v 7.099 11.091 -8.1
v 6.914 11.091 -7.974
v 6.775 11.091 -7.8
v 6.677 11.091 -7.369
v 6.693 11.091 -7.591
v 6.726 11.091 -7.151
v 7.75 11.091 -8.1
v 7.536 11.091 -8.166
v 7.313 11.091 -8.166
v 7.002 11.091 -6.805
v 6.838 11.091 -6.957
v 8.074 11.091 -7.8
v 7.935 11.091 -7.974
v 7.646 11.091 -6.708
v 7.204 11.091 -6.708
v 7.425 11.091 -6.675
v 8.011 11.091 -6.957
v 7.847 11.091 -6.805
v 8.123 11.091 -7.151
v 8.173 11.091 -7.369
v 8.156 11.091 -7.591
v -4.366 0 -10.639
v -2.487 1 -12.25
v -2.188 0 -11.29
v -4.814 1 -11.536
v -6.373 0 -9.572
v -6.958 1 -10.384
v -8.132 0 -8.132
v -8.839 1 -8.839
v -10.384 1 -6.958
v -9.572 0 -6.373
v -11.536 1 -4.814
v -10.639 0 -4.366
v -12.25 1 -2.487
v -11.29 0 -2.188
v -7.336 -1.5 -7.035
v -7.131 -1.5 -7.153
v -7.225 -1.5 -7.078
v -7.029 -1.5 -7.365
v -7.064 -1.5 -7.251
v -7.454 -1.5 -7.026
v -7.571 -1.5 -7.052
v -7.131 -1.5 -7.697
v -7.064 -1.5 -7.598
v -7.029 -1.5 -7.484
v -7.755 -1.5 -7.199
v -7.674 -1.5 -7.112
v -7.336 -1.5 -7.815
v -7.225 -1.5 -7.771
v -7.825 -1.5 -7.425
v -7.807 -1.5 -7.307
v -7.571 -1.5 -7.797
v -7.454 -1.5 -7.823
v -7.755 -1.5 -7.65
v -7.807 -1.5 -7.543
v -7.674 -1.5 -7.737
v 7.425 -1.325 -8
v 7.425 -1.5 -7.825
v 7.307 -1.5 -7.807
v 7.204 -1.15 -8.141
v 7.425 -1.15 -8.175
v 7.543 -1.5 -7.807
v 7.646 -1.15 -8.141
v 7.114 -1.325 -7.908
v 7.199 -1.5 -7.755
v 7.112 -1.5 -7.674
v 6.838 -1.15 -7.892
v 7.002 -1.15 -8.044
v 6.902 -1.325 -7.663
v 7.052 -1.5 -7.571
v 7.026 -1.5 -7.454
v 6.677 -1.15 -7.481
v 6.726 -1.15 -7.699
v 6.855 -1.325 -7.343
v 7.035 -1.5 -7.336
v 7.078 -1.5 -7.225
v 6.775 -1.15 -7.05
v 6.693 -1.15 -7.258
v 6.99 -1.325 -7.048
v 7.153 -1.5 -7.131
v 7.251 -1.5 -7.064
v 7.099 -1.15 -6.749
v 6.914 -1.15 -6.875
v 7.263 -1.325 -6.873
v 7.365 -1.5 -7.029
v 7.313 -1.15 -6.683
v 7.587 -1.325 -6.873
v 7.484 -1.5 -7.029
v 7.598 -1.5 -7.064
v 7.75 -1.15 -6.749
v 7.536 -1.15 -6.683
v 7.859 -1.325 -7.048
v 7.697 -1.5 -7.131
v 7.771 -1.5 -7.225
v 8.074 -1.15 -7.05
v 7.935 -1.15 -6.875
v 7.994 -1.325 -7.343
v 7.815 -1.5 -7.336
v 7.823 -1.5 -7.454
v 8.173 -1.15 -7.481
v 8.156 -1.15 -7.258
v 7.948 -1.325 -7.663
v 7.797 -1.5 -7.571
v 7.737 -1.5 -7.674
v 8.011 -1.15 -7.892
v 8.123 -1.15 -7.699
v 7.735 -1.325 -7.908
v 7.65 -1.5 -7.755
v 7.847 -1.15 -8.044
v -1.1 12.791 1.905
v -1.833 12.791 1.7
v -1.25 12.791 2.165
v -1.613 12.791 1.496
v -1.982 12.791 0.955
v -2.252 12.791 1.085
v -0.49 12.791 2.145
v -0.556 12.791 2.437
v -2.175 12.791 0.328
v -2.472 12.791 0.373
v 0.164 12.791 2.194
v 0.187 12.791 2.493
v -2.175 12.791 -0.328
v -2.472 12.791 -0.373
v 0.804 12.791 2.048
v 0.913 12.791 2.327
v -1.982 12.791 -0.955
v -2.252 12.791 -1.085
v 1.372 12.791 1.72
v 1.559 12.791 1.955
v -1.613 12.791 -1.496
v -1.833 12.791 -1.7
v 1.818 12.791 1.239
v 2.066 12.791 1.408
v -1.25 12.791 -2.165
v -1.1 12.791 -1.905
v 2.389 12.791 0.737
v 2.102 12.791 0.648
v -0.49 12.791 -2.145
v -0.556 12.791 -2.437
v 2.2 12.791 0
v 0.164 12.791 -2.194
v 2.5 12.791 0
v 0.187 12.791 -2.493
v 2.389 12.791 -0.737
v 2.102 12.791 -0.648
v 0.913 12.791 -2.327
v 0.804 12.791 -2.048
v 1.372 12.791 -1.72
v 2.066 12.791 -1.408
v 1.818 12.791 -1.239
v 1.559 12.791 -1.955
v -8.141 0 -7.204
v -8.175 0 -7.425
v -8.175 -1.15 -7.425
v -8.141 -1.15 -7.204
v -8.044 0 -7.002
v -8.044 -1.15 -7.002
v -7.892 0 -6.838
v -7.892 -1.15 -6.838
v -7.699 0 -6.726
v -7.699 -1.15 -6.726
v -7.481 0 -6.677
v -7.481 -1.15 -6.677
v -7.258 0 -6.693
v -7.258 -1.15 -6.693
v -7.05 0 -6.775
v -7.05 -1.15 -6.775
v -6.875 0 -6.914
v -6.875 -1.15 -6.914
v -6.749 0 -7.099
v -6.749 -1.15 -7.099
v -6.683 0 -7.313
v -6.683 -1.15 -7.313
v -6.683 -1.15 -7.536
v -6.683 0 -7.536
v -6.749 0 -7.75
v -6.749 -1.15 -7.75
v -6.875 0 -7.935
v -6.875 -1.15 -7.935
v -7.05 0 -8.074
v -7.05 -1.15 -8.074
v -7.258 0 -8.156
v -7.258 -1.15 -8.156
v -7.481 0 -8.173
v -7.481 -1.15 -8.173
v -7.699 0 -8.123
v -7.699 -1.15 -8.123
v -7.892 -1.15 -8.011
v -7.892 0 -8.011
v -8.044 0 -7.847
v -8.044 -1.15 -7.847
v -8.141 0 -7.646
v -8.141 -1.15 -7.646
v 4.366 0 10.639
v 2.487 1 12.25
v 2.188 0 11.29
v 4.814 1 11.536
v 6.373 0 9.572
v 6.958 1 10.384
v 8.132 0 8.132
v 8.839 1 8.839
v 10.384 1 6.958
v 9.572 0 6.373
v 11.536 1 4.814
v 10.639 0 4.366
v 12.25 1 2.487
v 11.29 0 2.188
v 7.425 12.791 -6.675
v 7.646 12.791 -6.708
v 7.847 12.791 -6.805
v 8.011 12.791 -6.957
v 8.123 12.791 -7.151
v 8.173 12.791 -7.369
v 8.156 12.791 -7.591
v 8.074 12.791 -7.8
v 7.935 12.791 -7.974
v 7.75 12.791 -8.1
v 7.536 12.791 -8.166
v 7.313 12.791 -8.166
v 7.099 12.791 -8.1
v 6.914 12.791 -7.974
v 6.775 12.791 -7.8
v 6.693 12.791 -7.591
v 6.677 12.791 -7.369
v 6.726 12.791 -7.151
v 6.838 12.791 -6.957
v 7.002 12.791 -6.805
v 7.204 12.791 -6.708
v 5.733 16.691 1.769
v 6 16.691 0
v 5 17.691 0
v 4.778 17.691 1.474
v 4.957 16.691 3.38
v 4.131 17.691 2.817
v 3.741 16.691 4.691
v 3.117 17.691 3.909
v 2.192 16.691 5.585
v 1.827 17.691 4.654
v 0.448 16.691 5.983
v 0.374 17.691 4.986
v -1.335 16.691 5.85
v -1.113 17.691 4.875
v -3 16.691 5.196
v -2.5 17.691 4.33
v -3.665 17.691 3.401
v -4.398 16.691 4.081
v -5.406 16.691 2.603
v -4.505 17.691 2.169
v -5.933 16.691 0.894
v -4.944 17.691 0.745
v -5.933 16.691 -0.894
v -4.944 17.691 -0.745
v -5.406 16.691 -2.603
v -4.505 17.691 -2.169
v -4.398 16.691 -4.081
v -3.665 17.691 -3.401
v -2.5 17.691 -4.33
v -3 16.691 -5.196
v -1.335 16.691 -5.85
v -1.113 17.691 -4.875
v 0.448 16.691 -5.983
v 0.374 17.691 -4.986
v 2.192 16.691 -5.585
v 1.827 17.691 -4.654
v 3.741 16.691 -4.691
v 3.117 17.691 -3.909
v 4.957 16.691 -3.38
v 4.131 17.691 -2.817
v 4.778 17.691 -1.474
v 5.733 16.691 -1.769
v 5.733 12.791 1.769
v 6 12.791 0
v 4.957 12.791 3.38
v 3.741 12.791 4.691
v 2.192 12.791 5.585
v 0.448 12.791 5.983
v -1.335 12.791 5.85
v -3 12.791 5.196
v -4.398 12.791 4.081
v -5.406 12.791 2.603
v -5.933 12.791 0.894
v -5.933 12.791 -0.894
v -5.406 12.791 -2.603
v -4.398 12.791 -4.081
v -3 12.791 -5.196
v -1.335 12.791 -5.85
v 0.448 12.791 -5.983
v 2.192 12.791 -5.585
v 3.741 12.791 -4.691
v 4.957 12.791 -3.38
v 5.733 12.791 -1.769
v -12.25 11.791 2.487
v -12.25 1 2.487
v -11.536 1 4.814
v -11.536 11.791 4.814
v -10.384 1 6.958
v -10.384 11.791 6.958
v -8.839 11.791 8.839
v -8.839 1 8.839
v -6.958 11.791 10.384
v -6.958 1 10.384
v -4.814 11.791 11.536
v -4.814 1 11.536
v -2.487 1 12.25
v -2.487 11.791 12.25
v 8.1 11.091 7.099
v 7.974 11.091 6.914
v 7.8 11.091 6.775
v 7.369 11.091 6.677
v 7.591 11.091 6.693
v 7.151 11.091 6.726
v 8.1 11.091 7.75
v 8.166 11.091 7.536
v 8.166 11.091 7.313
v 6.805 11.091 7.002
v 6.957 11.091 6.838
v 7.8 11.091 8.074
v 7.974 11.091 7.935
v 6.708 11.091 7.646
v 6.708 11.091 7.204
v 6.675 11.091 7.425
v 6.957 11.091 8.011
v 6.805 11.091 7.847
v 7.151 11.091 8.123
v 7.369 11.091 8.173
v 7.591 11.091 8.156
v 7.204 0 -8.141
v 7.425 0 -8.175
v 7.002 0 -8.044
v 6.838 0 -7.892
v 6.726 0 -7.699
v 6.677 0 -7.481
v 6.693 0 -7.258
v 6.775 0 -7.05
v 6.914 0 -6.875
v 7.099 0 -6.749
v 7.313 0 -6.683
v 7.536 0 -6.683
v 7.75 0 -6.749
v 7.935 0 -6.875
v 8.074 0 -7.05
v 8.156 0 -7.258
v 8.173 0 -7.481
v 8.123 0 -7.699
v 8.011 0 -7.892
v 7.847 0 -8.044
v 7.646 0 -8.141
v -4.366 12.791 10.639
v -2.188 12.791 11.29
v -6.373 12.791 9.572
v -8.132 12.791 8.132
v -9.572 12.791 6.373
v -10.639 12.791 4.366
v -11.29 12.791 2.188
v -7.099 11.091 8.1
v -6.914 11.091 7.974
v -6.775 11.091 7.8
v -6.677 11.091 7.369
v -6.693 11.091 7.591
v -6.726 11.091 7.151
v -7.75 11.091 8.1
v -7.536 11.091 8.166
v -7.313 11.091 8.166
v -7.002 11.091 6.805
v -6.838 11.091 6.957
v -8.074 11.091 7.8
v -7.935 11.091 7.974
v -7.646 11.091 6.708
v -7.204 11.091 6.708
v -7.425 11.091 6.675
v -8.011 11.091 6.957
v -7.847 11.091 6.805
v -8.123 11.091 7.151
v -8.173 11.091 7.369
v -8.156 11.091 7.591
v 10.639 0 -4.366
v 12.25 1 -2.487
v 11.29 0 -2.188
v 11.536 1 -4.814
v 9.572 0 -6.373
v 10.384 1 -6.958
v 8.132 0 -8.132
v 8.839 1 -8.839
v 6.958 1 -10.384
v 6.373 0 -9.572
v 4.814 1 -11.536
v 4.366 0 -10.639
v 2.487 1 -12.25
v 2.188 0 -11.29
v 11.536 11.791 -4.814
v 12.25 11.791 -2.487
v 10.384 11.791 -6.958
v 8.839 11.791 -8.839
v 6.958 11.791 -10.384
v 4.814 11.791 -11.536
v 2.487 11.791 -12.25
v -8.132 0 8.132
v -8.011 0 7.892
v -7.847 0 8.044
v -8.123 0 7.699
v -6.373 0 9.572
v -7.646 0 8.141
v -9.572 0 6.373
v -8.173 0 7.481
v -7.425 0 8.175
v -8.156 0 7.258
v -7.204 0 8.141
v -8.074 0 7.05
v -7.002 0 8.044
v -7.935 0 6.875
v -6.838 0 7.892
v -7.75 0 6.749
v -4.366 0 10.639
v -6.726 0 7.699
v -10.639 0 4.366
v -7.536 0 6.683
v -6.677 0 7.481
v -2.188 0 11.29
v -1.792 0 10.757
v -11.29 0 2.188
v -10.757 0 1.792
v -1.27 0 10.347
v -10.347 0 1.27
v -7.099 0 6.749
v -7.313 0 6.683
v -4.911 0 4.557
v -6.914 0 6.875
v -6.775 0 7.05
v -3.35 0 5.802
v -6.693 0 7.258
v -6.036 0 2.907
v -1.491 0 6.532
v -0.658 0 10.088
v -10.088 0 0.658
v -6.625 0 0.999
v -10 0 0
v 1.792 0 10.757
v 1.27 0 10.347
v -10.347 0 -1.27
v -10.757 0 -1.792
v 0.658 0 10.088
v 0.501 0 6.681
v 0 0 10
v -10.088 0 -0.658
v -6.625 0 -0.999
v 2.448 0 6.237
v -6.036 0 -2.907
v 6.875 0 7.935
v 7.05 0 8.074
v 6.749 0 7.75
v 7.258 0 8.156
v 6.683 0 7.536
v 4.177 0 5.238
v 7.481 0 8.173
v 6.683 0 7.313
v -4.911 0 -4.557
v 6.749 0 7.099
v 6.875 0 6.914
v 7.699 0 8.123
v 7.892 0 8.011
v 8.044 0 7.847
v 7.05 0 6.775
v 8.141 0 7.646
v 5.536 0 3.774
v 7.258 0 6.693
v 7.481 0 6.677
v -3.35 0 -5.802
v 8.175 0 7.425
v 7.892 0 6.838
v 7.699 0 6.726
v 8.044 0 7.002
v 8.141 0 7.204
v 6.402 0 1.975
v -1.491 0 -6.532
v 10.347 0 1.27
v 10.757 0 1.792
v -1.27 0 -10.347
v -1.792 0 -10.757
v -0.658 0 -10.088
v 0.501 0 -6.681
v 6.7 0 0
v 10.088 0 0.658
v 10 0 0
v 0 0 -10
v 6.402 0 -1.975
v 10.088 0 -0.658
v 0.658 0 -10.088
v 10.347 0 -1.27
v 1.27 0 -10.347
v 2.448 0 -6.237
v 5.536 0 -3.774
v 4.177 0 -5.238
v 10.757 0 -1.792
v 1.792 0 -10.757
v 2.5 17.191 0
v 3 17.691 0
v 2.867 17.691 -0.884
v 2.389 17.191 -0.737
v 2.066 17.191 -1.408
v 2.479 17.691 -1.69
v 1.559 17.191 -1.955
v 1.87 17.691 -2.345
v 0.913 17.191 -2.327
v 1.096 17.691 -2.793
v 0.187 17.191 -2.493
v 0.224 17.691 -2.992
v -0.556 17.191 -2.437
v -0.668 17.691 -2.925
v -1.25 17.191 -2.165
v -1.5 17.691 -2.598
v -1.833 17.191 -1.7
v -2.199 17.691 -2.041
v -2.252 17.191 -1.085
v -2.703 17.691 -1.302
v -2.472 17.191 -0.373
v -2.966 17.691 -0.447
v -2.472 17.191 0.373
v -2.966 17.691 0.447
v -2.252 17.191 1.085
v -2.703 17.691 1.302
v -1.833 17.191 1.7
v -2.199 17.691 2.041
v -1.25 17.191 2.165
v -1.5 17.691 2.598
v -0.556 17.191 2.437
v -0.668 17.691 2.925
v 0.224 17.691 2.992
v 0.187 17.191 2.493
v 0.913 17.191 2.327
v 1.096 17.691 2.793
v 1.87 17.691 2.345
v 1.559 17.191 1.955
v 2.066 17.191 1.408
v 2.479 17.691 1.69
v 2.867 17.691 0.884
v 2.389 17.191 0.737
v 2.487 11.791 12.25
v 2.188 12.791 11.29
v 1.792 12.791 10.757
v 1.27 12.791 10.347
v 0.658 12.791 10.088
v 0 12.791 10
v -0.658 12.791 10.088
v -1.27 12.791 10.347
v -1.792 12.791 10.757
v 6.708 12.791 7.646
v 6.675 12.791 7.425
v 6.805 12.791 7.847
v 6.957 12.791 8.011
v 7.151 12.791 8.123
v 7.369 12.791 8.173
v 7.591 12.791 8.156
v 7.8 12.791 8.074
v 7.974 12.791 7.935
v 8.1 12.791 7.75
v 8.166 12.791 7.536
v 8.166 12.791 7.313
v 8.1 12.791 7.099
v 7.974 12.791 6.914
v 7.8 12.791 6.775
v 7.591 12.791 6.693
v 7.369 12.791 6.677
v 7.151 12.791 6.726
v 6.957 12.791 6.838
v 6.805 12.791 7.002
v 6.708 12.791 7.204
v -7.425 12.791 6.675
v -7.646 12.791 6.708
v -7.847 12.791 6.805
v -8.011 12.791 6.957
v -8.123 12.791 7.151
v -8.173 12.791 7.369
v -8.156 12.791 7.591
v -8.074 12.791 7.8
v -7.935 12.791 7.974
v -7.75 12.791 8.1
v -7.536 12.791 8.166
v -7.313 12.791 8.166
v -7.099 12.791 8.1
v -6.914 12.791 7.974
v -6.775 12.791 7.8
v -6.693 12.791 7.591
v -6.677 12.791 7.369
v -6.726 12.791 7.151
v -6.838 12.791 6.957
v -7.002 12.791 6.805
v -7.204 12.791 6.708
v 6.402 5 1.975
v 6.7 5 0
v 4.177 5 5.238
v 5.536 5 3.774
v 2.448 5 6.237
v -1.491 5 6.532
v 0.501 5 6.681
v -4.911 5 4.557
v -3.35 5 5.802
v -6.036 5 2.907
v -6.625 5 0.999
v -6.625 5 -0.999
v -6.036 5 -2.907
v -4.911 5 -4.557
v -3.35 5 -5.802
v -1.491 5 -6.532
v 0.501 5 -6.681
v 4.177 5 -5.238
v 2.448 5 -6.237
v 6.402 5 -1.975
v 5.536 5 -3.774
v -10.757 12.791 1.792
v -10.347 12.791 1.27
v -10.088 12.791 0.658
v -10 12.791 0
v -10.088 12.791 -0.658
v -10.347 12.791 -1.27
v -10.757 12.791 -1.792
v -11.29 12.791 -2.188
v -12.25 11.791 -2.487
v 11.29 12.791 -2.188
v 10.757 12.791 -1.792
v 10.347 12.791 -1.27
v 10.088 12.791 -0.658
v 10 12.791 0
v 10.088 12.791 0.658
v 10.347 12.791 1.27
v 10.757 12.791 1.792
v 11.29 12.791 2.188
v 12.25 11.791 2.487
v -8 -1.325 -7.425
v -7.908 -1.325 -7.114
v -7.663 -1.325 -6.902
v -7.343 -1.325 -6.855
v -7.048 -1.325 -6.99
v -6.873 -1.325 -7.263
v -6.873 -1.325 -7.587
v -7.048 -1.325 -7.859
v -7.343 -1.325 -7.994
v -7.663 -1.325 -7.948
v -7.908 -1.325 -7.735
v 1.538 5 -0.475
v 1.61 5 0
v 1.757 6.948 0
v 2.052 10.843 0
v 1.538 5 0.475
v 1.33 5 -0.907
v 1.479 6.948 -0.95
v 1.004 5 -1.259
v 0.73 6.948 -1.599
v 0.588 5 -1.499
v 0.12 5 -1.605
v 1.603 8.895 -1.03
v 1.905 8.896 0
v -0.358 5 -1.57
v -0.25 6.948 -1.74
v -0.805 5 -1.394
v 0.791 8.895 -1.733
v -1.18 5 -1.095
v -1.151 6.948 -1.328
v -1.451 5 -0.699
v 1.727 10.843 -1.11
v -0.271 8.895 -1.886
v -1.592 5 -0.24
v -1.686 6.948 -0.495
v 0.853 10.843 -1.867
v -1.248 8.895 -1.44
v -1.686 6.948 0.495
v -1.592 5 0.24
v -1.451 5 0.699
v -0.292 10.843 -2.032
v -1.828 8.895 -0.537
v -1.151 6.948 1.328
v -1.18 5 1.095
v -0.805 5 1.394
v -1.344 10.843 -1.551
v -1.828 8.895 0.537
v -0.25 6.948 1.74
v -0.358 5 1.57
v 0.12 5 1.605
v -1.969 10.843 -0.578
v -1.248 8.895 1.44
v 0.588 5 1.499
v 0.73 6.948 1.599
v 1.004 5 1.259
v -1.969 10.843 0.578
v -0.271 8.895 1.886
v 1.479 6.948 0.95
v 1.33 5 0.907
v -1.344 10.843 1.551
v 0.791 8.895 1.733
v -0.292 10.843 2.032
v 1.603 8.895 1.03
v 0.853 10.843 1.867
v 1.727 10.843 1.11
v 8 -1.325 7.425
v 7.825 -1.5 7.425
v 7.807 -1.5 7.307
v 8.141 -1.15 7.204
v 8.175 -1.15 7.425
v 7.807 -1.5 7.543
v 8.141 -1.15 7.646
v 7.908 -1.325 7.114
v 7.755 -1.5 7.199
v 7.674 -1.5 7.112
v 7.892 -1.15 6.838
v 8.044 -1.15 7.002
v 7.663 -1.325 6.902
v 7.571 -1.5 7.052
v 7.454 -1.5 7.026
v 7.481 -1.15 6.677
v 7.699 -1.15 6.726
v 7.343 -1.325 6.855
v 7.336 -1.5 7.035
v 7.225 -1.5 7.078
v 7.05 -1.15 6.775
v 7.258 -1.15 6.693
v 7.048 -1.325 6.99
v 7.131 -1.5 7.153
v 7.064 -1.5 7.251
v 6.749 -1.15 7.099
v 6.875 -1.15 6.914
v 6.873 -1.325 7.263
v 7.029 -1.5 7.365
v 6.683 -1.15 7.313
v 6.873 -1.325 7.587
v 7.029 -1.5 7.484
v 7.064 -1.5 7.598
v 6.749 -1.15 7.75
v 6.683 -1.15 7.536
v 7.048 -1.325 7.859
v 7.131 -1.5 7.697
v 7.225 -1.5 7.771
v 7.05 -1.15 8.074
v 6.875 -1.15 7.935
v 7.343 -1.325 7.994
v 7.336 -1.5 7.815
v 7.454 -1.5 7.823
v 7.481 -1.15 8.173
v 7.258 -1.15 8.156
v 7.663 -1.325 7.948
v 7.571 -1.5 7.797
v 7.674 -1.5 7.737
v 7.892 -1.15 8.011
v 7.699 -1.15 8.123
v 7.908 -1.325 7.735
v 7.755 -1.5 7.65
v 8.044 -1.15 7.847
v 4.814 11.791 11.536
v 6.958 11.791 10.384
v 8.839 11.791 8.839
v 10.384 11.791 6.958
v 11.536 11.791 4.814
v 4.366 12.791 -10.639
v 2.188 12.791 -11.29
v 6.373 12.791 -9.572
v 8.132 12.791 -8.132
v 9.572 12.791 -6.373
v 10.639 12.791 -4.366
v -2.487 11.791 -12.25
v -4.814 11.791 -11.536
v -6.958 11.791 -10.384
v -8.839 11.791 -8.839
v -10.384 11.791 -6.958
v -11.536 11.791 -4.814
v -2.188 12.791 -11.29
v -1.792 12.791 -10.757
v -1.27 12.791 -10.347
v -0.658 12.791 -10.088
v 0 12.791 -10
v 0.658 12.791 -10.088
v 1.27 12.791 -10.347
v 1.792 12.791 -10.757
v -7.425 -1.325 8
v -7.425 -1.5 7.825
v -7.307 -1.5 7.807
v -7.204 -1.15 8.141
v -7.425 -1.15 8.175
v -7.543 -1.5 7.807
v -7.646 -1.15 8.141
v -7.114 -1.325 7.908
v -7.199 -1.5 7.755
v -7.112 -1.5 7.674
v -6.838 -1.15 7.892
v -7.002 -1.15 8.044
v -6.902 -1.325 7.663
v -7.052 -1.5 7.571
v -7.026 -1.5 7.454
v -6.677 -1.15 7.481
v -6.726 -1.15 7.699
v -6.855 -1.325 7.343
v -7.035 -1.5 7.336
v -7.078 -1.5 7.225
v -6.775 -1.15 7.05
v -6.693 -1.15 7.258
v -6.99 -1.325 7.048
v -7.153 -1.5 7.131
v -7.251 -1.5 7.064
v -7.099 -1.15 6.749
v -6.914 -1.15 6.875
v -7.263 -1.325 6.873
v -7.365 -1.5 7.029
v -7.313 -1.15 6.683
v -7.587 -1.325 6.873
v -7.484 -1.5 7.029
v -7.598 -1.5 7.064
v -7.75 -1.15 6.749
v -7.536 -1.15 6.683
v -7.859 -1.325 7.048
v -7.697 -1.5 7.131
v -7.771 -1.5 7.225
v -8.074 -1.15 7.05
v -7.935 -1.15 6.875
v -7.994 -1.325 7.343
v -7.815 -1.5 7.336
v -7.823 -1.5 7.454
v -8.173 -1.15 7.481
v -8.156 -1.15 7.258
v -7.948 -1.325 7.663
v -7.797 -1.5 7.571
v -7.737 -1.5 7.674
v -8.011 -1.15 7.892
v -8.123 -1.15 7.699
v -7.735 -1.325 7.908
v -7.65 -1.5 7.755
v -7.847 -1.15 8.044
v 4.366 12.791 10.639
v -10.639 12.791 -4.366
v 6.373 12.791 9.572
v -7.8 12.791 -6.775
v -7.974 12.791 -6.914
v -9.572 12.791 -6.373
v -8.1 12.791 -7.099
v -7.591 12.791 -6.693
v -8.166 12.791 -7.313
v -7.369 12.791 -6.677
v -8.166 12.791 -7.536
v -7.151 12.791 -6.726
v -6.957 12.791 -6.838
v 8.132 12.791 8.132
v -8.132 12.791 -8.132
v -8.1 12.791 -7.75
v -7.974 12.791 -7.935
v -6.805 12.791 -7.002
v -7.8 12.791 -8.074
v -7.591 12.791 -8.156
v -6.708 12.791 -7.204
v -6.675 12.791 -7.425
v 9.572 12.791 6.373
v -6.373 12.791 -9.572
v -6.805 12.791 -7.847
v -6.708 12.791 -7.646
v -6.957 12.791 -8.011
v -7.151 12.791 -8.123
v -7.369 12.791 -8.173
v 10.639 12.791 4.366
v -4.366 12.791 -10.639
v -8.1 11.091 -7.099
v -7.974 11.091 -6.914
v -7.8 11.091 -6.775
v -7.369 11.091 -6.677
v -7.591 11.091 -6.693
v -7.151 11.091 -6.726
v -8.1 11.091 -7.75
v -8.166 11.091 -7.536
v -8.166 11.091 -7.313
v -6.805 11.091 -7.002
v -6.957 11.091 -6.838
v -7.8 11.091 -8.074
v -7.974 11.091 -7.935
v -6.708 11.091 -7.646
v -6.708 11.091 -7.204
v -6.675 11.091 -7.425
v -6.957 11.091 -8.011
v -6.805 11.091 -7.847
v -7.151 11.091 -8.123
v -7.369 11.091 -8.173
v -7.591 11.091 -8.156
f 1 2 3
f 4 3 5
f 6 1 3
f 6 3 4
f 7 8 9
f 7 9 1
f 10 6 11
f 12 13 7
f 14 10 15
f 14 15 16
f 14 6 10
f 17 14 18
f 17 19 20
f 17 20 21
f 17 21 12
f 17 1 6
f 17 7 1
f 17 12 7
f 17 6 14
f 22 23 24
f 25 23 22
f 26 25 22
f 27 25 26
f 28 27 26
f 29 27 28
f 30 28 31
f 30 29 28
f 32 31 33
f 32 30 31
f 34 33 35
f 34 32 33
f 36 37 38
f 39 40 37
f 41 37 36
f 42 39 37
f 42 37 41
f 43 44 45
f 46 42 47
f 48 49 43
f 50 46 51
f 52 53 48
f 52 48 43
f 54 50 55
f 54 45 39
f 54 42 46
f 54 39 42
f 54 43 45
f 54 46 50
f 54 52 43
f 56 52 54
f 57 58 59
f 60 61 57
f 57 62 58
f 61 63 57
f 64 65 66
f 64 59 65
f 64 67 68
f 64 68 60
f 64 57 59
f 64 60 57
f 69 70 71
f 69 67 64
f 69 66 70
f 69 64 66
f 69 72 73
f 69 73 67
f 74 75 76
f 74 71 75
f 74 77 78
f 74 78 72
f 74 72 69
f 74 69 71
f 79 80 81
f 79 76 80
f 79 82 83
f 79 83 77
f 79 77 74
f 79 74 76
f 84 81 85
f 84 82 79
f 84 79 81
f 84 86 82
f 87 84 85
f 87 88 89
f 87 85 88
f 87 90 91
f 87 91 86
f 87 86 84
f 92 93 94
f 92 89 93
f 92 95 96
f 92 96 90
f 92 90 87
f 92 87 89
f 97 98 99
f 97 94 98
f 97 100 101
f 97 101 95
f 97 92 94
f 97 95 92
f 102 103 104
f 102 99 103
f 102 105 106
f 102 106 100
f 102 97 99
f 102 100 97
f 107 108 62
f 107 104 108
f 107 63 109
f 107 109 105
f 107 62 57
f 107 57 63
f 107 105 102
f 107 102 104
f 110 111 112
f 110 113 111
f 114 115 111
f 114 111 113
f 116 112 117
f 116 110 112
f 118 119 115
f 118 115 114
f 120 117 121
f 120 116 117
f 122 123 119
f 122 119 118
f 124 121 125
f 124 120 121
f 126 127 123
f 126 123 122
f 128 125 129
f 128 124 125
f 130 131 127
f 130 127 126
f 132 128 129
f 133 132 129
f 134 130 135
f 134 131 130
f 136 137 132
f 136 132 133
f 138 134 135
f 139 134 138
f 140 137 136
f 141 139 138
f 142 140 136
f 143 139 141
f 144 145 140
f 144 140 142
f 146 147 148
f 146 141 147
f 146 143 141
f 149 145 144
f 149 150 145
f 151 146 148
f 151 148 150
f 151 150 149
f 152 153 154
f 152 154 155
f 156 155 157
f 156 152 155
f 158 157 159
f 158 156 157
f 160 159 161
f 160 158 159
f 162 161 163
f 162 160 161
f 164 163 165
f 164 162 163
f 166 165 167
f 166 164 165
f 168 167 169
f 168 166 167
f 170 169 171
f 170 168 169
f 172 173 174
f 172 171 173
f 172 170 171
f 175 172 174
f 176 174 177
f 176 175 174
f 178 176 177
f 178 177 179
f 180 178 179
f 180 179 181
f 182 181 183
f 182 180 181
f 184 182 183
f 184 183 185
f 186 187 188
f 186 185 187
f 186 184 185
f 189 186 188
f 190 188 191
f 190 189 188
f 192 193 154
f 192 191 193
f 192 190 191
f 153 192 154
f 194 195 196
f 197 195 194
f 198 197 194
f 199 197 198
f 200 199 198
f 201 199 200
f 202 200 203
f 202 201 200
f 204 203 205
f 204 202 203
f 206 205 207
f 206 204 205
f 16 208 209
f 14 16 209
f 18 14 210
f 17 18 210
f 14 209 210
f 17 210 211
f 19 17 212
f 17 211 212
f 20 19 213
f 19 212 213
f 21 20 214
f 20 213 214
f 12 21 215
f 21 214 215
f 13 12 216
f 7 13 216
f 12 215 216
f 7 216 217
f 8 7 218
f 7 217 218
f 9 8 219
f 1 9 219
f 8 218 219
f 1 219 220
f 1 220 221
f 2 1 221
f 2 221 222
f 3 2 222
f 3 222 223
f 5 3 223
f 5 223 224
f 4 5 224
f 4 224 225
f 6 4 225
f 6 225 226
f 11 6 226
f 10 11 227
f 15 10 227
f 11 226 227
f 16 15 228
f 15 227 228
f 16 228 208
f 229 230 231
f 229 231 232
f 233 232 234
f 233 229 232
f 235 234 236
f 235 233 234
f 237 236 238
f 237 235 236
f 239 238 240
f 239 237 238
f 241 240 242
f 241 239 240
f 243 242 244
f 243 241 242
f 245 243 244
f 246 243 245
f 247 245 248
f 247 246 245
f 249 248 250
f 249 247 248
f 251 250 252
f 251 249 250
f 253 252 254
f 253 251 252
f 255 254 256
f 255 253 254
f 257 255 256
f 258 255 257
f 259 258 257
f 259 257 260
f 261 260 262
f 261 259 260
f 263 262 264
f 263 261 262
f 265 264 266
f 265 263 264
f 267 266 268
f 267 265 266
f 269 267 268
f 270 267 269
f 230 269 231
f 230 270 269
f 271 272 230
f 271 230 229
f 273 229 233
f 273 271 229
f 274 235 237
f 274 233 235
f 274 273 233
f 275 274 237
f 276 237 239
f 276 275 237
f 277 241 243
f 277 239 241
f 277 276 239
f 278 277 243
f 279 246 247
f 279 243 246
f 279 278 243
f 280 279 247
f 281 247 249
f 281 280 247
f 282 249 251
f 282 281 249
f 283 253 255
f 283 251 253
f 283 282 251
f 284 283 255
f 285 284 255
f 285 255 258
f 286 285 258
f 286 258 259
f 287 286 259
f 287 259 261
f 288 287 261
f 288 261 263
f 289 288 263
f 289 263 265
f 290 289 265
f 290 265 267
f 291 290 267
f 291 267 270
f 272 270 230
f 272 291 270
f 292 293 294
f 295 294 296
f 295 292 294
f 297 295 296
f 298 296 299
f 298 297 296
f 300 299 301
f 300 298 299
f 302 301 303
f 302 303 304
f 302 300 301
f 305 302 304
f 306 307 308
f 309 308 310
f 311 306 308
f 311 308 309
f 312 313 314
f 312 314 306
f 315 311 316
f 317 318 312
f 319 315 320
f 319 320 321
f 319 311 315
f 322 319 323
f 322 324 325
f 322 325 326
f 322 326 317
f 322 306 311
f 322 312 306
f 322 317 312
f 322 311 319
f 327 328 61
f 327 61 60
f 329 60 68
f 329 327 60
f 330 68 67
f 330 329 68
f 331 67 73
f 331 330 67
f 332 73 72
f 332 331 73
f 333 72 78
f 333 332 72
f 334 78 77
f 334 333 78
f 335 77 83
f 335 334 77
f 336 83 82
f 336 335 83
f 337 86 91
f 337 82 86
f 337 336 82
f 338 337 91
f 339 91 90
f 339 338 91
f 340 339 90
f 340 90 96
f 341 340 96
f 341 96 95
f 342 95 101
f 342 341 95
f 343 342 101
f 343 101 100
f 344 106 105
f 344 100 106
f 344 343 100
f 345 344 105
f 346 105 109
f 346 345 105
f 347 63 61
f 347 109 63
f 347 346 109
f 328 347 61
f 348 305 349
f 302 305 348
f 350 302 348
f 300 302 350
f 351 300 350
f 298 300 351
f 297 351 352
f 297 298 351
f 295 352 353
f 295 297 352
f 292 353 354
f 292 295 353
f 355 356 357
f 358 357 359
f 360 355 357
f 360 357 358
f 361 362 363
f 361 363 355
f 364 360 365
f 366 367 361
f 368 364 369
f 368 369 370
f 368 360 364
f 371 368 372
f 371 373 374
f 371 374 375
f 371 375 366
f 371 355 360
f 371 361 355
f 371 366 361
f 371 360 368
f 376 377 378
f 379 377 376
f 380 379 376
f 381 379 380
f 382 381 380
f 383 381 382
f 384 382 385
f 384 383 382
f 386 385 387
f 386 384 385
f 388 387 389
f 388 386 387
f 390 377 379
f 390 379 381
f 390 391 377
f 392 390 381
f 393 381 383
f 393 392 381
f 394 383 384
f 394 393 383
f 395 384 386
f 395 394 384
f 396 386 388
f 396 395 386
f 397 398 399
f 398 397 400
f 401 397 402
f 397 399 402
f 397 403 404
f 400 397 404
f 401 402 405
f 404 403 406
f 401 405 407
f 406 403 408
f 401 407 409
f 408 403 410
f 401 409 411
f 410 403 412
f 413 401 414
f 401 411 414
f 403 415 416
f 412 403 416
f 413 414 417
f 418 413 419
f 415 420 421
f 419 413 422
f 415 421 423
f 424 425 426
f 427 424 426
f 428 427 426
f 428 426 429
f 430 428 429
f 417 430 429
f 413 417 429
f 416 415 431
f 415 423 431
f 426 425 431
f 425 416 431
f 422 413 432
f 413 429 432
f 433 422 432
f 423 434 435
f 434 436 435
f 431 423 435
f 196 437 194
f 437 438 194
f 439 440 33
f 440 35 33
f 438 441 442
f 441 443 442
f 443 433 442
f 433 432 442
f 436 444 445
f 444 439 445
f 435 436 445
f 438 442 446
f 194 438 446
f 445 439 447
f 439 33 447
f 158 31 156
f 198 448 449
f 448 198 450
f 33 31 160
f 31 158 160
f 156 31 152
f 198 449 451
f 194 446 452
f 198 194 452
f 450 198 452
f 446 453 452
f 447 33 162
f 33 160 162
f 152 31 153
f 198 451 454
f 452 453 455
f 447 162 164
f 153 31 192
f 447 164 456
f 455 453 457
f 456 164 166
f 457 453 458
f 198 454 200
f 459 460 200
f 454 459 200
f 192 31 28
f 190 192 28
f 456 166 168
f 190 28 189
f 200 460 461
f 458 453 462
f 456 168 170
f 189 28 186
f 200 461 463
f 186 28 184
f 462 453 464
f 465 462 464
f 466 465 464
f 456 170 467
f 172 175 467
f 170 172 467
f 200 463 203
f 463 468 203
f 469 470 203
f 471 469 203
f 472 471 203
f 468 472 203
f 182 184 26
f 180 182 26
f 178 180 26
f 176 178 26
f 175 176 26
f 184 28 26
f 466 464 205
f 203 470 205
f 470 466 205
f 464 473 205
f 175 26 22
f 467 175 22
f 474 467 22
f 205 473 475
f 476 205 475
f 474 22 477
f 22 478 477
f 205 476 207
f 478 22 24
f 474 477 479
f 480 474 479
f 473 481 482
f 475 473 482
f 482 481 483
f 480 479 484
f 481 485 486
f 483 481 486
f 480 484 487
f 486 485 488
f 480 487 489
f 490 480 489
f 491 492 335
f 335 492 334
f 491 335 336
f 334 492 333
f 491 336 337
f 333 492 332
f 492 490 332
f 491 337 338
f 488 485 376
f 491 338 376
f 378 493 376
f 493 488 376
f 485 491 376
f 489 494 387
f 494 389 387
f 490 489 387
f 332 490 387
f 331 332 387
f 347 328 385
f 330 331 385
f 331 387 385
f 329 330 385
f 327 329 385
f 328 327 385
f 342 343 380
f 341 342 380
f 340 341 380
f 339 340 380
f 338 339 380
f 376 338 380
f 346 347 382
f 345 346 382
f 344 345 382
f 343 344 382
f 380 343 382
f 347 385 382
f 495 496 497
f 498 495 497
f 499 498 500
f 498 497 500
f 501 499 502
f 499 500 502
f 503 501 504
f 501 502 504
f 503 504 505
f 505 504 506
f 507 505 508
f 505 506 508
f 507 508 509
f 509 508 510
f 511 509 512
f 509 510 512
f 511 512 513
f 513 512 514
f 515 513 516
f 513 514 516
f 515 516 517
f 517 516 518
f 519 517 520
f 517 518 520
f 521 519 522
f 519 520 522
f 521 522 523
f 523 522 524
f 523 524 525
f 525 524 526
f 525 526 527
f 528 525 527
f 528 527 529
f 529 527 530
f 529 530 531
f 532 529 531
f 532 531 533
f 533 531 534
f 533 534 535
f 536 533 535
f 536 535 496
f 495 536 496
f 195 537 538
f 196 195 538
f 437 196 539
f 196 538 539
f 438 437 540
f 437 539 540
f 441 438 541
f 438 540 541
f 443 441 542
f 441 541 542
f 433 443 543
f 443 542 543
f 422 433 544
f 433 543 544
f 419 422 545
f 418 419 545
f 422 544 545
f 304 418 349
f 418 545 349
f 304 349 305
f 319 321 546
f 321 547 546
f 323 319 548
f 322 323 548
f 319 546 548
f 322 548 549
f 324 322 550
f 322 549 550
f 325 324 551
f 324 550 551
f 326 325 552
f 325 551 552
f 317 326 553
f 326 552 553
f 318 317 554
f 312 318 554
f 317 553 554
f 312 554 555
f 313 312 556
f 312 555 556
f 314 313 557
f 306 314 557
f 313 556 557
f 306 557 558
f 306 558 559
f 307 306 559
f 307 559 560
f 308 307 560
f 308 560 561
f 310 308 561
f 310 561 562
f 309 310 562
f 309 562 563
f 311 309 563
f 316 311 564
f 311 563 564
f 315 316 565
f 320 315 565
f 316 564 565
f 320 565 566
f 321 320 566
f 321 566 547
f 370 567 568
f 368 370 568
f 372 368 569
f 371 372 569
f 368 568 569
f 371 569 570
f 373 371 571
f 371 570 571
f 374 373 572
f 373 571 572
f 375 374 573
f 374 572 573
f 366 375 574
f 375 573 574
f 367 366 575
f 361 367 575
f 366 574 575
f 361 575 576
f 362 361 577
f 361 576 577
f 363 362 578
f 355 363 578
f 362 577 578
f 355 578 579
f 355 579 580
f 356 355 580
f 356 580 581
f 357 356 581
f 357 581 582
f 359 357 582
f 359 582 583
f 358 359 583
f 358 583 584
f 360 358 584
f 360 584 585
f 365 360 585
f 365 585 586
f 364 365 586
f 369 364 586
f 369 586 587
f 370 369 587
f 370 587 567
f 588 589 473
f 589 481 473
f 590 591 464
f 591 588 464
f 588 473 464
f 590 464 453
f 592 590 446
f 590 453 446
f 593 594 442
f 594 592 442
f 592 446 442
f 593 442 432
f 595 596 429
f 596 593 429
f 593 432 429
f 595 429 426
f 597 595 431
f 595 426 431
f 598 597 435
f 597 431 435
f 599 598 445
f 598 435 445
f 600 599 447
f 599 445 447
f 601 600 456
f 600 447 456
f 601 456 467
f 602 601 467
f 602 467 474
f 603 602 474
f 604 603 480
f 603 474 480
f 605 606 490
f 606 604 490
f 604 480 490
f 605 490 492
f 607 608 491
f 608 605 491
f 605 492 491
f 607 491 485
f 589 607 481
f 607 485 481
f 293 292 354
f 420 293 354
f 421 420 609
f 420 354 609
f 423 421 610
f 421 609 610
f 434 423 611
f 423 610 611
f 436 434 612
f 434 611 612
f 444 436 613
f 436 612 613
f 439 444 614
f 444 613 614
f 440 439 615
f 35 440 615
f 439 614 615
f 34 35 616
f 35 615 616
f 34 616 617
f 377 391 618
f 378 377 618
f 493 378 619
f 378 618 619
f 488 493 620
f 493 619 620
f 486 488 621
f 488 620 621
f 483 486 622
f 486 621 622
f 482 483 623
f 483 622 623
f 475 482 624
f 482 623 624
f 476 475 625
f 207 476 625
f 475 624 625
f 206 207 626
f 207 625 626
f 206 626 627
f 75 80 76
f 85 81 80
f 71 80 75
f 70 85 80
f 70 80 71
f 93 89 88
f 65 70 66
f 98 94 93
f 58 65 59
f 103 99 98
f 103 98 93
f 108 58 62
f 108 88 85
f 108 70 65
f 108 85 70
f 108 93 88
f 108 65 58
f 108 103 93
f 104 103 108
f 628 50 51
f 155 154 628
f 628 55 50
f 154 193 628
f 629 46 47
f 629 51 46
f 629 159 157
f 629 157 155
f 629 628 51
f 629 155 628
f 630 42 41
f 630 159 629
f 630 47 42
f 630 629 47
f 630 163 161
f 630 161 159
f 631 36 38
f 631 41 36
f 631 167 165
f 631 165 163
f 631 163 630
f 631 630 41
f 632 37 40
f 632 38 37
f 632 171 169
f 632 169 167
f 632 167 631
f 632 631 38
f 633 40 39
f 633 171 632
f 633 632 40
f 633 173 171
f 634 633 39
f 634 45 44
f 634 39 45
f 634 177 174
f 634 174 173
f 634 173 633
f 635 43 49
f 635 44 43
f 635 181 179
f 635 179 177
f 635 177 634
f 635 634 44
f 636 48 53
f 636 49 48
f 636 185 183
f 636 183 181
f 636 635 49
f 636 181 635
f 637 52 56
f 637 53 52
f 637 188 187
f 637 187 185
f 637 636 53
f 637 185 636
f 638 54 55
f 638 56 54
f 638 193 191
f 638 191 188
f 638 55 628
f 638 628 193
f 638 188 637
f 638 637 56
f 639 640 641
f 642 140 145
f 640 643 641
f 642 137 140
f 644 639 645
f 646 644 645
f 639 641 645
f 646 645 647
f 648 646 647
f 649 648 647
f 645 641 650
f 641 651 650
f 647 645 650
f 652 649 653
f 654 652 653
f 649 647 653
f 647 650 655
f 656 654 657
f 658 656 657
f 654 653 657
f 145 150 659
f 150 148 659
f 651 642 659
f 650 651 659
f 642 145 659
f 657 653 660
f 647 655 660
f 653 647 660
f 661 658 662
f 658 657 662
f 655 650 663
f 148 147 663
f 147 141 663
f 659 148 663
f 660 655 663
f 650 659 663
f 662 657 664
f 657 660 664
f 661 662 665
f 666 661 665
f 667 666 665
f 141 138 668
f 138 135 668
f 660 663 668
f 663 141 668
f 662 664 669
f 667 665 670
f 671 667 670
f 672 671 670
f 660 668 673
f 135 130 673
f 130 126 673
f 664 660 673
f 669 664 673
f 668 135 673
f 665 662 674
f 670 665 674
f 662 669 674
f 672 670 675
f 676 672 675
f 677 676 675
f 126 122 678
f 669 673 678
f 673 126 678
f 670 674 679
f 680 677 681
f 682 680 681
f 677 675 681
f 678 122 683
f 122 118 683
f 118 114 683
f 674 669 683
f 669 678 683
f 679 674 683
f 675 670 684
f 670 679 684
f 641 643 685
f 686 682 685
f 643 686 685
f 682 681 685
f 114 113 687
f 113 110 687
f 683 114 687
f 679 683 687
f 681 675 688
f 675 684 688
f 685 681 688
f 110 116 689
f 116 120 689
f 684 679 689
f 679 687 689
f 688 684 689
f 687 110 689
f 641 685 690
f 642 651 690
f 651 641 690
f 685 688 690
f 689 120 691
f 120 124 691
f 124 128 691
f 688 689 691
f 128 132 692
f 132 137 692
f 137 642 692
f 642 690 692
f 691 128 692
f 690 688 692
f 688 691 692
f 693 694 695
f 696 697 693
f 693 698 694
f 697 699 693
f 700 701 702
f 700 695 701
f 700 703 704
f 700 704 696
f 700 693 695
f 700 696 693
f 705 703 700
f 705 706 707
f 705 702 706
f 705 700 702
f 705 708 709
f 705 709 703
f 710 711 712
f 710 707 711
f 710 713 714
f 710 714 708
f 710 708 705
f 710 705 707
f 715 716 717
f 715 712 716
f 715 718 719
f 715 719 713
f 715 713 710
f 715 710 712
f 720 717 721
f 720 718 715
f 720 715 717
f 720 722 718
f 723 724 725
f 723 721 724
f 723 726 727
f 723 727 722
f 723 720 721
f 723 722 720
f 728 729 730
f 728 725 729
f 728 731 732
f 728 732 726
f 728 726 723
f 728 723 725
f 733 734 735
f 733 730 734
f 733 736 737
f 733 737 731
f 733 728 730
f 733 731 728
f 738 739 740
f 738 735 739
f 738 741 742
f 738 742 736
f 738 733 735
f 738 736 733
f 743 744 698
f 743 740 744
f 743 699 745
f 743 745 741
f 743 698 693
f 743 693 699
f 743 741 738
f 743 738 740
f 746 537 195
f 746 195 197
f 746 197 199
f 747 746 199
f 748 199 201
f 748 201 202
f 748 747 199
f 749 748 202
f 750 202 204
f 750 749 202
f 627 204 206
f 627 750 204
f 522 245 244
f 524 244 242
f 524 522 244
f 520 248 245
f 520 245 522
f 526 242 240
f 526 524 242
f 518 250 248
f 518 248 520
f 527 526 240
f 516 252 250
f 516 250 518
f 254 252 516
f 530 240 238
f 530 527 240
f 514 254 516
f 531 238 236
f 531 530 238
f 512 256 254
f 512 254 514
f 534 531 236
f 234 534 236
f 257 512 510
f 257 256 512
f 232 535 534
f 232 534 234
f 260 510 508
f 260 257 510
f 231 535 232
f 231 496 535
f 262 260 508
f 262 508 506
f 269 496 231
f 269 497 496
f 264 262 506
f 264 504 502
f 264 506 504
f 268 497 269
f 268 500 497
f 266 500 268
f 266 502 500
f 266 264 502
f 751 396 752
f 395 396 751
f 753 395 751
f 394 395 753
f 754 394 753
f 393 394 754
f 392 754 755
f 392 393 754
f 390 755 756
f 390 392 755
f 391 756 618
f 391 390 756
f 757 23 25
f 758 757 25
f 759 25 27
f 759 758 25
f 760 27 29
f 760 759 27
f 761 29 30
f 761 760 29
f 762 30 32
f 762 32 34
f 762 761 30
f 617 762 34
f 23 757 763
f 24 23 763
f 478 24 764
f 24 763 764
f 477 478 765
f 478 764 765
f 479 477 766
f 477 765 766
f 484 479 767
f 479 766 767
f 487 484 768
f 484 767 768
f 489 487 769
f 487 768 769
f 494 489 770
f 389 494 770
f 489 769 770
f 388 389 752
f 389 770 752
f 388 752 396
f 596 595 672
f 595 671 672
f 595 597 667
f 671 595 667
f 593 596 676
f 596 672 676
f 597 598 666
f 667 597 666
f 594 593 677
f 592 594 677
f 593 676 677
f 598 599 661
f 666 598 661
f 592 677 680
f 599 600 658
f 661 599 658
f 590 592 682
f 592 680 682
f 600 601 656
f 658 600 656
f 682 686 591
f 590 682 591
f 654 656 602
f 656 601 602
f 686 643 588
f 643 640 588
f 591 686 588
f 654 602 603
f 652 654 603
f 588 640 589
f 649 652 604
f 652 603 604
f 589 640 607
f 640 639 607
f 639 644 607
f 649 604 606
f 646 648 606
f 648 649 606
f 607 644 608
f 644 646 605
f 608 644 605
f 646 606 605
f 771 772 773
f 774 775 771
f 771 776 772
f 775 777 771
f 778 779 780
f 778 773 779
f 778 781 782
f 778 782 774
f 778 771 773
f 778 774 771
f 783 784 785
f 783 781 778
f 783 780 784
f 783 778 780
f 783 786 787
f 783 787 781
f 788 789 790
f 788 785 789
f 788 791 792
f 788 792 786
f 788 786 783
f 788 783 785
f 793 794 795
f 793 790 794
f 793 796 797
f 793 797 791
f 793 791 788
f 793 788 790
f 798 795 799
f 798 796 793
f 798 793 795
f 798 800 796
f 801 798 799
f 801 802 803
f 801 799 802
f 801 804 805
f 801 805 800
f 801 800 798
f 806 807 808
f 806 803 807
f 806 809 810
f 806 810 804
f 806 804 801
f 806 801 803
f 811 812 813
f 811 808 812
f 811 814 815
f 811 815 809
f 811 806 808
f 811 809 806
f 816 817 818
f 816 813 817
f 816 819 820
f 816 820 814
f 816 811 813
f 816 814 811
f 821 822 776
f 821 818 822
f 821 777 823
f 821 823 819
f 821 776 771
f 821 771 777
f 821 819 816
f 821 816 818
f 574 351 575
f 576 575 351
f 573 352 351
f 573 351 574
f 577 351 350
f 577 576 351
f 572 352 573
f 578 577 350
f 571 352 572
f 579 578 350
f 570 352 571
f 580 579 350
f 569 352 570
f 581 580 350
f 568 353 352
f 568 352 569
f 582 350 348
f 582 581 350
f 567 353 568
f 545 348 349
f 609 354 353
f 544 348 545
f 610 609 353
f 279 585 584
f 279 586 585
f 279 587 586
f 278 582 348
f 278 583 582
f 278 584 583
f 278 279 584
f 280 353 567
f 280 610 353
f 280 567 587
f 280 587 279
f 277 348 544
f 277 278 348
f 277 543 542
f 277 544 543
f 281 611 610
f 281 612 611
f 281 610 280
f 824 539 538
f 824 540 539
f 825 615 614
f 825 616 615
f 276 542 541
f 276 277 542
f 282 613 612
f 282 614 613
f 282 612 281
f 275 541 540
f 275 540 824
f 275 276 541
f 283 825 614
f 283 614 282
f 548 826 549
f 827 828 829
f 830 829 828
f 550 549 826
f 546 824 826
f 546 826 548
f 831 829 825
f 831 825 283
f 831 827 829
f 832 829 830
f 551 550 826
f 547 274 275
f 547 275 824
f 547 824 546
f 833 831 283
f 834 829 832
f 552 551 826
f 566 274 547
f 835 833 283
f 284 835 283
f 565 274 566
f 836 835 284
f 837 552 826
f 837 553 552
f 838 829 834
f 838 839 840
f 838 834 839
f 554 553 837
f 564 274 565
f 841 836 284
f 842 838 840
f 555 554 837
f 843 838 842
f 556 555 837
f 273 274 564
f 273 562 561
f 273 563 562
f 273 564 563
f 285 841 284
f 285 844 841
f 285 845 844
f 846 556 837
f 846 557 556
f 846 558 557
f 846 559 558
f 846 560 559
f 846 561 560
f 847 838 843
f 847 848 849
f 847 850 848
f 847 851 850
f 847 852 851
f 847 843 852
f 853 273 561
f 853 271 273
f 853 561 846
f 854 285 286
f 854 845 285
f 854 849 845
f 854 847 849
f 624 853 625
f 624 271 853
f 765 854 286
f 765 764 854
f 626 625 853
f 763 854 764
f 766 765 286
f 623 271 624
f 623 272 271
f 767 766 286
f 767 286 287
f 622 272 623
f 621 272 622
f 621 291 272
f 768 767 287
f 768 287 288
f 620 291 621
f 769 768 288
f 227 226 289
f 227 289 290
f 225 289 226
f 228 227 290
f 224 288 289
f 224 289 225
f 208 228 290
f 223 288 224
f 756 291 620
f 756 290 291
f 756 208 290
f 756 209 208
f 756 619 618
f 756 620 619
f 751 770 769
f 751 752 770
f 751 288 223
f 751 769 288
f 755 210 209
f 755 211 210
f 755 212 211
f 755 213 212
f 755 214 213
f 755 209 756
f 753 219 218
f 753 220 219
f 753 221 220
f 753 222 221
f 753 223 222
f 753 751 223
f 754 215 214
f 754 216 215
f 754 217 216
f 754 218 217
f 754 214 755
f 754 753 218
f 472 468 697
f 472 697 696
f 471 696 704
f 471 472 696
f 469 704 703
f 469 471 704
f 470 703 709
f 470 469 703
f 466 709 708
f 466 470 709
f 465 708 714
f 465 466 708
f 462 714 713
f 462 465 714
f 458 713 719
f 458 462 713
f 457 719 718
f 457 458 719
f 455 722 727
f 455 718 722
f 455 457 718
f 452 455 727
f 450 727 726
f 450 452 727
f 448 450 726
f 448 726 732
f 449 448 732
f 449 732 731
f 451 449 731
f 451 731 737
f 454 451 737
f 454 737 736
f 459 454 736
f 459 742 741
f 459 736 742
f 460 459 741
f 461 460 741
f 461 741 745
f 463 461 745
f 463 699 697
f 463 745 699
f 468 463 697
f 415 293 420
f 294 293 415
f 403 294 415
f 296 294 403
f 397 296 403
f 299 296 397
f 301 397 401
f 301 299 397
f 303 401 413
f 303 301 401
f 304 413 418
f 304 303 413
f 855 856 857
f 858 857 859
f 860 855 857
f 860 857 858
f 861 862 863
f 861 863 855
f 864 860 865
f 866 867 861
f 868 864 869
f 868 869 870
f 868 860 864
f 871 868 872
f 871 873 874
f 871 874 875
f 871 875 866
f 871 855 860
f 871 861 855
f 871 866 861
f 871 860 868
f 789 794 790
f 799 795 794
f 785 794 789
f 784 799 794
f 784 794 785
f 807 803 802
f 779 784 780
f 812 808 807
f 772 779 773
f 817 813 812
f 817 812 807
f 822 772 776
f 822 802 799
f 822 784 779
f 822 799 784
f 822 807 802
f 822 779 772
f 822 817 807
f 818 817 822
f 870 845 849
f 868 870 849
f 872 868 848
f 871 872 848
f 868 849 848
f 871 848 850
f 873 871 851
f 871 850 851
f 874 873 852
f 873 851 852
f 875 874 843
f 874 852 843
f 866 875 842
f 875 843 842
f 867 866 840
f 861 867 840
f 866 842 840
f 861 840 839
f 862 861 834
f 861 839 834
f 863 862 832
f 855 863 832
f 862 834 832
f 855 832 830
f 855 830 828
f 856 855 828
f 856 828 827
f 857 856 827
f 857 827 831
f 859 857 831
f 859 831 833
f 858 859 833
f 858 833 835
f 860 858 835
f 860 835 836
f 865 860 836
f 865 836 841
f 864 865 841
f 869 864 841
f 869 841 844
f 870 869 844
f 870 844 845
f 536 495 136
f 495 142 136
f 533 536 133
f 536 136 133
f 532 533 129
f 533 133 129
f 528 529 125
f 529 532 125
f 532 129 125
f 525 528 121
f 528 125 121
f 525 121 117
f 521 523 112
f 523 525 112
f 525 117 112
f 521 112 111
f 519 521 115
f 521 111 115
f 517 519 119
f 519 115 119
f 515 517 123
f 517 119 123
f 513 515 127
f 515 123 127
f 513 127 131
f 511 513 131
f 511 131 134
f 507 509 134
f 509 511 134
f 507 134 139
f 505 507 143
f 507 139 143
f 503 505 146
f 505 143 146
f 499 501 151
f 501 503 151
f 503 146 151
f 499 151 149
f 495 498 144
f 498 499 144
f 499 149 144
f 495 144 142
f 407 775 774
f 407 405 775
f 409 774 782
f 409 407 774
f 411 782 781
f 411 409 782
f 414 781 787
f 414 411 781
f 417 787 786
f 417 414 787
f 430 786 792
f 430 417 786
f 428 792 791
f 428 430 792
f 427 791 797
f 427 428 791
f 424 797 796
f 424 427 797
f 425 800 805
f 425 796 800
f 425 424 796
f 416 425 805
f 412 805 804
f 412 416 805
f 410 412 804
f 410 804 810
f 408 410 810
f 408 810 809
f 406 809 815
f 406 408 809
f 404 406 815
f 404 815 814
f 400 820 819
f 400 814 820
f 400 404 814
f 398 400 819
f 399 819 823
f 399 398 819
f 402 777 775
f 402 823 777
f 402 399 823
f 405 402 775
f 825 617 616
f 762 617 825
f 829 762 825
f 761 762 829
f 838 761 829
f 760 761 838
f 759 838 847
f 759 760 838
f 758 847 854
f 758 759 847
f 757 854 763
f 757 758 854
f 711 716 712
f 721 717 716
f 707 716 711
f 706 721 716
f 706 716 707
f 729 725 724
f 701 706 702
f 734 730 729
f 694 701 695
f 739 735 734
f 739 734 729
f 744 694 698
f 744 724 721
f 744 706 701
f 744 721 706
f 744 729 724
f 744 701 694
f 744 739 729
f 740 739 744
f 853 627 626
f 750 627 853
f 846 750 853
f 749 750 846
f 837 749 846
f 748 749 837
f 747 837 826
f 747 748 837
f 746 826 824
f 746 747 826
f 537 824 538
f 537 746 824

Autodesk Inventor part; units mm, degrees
ref_plane "YZ Plane" through (0, 0, 0) normal (1, 0, 0) x (0, 1, 0)
ref_plane "XZ Plane" through (0, 0, 0) normal (0, 1, 0) x (-1, 0, 0)
ref_plane "XY Plane" through (0, 0, 0) normal (0, 0, 1) x (1, 0, 0)
sketch "Sketch1" plane through (0, 0, 0) normal (0, 0, 1) x (1, 0, 0)
  line L0 (0, 0) -> (0, 19.4488) construction
  line L1 (0, 0) -> (15.8946, 0) construction
  line L2 (1.61, 5) -> (6.7, 5)
  line L3 (6.7, 5) -> (6.7, 0)
  line L4 (6.7, 0) -> (12.5, 0)
  line L5 (12.5, 0) -> (12.5, 12.791)
  line L6 (1.0049, 10.15) -> (0.7849, 10.15) construction
  line L7 (1.6103, 4.761) -> (2.6467, 18.8742) construction
  line L8 (0.4645, 3.15) -> (0.2, 3.15) construction
  line L9 (0, 2.7) -> (1.1563, 2.7) construction
  line L10 (12.5, 12.791) -> (2.2, 12.791)
  line L11 (2.2, 12.791) -> (1.61, 5)
  point P0 (9.6, 0)
  dimension "d1" = 12.5
  dimension "d2" = 6.7
  dimension "d7" = 5
  dimension "d53" = 0.22
  dimension "d55" = 0.2
  dimension "d58" = 2.3
  dimension "d62" = 1.61
  dimension "d63" = 2.2
  dimension "d64" = 12.791
revolve "Revolution1" add sketch "Sketch1" angle 360 about axis through (0, 0, 0) along (0, 1, 0)
chamfer "Chamfer2" distance 1 angle 45 2 edges at (-12.5, 0, 0) (-12.5, 12.791, 0)
sketch "Sketch7" plane through (0, 12.791, 0) normal (0, 1, 0) x (1, 0, 0)
  circle A0 centre (0, 0) radius 10.5 construction
  line L0 (0, 0) -> (23.4924, 0) construction
  line L1 (0, 0) -> (0, 17.9898) construction
  line L2 (0, 0) -> (-15.6301, 15.6301) construction
  circle A1 centre (-7.4246, 7.4246) radius 0.75
  point P0 (12.4999, 0)
  dimension "d84" = 21
  dimension "d85" = 45
  dimension "d86" = 1.5
extrude "Extrusion6" cut sketch "Sketch7" against normal blind 1.7
sketch "Sketch8" plane through (0, 12.791, 0) normal (0, 1, 0) x (1, 0, 0)
  circle A0 centre (0, 0) radius 12.5 construction
  line L0 (0, 0) -> (0, 17.9558) construction
  circle A1 centre (0, 12.5) radius 2.5
  dimension "d89" = 25
  dimension "d90" = 5
extrude "Extrusion7" cut sketch "Sketch8" against normal blind 12.791
pattern_circular "Circular Pattern4" count 4 over 360 about axis through (0, 8.8955, 0) along (0, -1, 0) of "Extrusion6", "Extrusion7"
sketch "Sketch9" plane through (0, 12.791, -12.5) normal (0, 1, 0) x (1, 0, 0)
  circle A0 centre (0, -12.5) radius 6
  circle A1 centre (0, -12.5) radius 2.5
  dimension "d96" = 12
  dimension "d97" = 5
extrude "Extrusion8" add sketch "Sketch9" along normal blind 4.9
chamfer "Chamfer7" distance 1 angle 45 1 edges at (-6, 17.691, 0)
chamfer "Chamfer8" distance 0.5 angle 45 1 edges at (-2.5, 17.691, 0)
sketch "Sketch10" plane through (0, 0, -12.5) normal (0, -1, 0) x (1, 0, 0)
  circle A0 centre (0, 12.5) radius 10.5 construction
  line L0 (0, 12.5) -> (14.2322, 12.5) construction
  line L1 (0, 12.5) -> (13.4469, 25.9469) construction
  circle A1 centre (7.4246, 19.9246) radius 0.75
  dimension "d106" = 21
  dimension "d107" = 45
  dimension "d108" = 1.5
extrude "Extrusion9" add sketch "Sketch10" along normal blind 1.5
chamfer "Chamfer9" distance 0.35 angle 45 1 edges at (6.6746, -1.5, 7.4246)
pattern_circular "Circular Pattern5" count 4 over 360 about axis through (0, 2.5, 0) along (0, -1, 0) of "Extrusion9", "Chamfer9"
equation "\"cutpipette_length\" = 5.7"
properties part number "cpd_lowrcf_1.3_p2_20230620"
